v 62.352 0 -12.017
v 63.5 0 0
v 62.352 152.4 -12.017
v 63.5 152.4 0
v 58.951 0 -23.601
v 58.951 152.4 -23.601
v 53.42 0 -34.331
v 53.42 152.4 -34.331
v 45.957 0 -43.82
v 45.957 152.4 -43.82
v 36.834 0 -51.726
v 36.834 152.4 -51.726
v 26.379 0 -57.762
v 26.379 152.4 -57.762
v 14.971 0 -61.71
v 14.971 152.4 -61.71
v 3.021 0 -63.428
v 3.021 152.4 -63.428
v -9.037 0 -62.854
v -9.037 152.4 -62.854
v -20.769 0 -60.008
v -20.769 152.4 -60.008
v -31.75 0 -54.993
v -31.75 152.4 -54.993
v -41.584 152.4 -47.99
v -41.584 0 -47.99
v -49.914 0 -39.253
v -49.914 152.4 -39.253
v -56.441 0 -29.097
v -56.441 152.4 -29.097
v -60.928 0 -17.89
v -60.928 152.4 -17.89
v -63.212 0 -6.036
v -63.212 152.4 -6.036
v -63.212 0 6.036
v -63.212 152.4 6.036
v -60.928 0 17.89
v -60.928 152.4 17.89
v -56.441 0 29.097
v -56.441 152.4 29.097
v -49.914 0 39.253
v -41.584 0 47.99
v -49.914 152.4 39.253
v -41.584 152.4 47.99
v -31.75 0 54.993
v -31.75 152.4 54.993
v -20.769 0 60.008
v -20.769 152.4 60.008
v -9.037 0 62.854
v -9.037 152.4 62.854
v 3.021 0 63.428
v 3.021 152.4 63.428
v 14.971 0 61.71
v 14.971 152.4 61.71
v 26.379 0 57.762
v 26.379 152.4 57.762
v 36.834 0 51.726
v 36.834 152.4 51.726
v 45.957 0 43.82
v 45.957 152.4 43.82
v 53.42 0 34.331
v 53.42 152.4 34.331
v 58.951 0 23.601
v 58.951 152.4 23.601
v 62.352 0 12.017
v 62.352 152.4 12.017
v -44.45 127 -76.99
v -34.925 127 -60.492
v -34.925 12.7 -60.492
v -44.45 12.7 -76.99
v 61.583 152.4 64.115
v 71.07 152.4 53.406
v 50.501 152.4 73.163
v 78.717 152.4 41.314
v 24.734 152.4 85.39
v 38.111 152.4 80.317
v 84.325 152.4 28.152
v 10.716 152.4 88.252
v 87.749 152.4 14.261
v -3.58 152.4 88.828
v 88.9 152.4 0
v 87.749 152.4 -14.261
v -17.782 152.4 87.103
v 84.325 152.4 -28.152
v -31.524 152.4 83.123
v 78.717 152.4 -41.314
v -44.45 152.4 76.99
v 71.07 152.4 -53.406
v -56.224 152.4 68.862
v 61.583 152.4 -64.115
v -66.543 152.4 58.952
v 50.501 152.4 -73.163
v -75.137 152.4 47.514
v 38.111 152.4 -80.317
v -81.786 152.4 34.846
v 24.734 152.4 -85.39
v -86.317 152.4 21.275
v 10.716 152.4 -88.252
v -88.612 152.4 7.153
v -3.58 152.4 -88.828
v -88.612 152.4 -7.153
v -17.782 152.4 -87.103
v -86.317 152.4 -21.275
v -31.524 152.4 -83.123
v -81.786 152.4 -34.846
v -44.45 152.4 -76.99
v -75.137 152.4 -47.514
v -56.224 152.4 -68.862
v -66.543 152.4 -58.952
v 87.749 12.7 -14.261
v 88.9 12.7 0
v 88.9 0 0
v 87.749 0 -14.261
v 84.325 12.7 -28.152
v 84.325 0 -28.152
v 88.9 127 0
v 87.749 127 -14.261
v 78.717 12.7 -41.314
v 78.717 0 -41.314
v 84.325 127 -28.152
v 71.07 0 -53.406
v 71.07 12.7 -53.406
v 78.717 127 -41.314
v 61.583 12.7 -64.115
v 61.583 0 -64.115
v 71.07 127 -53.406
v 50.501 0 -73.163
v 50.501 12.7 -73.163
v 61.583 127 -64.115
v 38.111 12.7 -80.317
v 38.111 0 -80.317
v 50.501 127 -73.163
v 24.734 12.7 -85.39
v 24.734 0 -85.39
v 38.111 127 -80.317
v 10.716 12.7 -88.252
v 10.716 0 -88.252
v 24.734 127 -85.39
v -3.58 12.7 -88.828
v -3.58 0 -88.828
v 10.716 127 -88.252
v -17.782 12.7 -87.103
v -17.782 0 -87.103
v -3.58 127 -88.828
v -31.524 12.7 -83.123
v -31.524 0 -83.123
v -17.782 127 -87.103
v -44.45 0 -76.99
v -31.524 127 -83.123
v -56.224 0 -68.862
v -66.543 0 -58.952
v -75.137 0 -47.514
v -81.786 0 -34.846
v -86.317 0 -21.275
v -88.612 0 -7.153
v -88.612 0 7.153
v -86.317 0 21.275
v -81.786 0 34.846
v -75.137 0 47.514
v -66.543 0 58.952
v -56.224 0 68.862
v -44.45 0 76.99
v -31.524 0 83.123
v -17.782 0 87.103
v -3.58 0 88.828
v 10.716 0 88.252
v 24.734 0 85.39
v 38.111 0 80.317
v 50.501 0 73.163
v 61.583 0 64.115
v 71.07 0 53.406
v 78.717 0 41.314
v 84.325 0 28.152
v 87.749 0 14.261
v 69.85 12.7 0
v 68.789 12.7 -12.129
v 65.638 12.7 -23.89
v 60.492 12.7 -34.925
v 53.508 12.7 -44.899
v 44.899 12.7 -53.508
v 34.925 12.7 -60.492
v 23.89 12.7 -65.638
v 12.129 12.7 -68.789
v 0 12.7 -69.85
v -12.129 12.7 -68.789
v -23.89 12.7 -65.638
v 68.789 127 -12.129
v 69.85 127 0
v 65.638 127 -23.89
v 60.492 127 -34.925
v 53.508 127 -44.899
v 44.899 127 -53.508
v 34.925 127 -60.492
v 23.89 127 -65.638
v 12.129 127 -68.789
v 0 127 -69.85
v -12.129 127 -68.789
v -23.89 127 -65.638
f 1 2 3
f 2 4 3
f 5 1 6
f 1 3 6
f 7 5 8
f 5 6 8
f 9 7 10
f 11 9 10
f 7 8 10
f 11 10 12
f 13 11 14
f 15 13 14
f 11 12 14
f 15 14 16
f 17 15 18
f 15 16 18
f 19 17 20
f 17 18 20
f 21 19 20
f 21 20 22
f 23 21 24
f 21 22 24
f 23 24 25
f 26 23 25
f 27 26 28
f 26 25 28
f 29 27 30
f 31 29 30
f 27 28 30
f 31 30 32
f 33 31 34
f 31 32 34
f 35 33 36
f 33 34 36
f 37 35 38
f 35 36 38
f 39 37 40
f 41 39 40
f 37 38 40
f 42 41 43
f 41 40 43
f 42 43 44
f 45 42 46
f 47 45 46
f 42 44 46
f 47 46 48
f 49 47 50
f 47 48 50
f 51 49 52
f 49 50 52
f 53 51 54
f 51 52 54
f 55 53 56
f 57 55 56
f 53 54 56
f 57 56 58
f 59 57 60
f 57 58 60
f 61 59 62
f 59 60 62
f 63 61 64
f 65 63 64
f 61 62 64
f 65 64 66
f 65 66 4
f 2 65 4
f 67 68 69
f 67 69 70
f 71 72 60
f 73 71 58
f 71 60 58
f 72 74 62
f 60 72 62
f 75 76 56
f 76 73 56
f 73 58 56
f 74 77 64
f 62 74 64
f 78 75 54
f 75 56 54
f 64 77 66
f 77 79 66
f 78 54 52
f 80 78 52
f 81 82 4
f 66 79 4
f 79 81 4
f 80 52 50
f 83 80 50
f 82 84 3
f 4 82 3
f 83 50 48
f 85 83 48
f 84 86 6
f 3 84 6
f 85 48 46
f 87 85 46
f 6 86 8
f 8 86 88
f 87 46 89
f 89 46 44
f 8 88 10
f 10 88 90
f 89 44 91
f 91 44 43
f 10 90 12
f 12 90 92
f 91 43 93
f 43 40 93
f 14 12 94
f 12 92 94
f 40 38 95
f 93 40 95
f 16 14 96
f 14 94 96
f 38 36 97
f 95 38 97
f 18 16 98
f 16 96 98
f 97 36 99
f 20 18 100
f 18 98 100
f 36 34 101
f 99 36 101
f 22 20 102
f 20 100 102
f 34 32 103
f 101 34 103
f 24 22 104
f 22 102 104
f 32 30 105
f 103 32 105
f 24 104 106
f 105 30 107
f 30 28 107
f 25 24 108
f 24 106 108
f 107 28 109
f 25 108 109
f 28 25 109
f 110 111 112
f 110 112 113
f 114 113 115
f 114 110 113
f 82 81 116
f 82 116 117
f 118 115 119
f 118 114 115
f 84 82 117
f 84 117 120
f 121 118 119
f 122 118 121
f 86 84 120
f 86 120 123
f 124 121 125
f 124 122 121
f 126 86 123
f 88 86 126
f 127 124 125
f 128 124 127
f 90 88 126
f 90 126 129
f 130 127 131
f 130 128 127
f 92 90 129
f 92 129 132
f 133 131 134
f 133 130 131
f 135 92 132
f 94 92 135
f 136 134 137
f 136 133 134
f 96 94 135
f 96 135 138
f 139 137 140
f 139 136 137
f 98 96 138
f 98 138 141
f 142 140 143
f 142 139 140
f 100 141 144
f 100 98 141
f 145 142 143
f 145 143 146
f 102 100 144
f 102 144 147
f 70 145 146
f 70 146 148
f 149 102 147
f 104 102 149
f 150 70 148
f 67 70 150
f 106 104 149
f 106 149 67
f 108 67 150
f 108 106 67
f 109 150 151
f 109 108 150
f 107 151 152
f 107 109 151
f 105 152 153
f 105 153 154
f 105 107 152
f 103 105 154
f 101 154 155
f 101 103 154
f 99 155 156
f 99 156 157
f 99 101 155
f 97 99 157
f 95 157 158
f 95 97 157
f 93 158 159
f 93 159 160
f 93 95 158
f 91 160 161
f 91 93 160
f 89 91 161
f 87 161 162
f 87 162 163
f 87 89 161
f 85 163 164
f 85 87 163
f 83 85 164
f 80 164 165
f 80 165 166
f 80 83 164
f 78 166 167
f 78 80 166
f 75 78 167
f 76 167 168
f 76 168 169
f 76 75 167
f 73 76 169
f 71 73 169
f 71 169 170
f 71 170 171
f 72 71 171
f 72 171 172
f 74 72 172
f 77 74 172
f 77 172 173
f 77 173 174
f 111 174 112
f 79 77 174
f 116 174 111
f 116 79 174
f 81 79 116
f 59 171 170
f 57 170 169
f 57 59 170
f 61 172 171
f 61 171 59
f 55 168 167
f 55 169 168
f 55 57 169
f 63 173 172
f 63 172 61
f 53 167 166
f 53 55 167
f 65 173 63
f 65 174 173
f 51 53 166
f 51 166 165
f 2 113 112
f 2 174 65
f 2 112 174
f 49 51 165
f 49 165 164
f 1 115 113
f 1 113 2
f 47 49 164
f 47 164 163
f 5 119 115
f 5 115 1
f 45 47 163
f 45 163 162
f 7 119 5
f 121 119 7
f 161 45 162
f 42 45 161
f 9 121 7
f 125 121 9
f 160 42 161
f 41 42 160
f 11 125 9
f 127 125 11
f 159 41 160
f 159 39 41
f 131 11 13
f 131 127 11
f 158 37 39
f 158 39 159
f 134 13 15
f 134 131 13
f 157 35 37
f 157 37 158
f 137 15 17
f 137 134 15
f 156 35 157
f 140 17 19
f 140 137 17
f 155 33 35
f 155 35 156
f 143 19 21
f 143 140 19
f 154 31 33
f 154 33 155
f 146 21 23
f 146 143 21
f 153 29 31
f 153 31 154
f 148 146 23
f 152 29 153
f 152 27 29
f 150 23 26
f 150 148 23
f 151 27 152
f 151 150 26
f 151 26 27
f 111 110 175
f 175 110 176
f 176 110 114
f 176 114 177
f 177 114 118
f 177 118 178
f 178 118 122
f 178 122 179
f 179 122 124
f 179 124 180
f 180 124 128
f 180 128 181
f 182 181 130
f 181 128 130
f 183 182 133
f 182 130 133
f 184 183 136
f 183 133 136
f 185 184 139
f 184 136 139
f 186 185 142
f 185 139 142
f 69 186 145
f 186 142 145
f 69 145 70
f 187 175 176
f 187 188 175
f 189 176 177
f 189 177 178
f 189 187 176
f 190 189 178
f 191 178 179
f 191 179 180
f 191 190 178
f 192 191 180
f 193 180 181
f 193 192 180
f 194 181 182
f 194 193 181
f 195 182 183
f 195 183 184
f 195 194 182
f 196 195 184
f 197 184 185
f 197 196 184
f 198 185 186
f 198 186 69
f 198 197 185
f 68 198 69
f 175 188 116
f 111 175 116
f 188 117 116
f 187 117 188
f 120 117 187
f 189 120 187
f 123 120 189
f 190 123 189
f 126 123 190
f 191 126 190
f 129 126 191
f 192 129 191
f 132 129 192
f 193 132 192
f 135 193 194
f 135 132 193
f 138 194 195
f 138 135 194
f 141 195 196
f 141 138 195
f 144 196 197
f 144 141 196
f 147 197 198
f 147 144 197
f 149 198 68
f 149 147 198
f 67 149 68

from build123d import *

# Parameters (mm, degrees)
SKETCH1_W          = 25.4
SKETCH1_H          = 152.4
SKETCH2_W          = 19.05
SKETCH2_H          = 114.3
CUT_REVOLVE1_ANGLE = 120


with BuildPart() as part:
    # Sketch1 → Revolve1 (revolve)
    with BuildSketch(Plane.XY):
        with Locations((76.2, 76.2)):
            Rectangle(SKETCH1_W, SKETCH1_H)
    revolve(axis=Axis((0, 0, 0), (0, 1, 0)))

    # Sketch2 → Cut-Revolve1 (revolve, cut)
    with BuildSketch(Plane.XY):
        with Locations((79.375, 69.85)):
            Rectangle(SKETCH2_W, SKETCH2_H)
    revolve(axis=Axis((0, 0, 0), (0, 1, 0)), revolution_arc=CUT_REVOLVE1_ANGLE, mode=Mode.SUBTRACT)


solid = part.part
